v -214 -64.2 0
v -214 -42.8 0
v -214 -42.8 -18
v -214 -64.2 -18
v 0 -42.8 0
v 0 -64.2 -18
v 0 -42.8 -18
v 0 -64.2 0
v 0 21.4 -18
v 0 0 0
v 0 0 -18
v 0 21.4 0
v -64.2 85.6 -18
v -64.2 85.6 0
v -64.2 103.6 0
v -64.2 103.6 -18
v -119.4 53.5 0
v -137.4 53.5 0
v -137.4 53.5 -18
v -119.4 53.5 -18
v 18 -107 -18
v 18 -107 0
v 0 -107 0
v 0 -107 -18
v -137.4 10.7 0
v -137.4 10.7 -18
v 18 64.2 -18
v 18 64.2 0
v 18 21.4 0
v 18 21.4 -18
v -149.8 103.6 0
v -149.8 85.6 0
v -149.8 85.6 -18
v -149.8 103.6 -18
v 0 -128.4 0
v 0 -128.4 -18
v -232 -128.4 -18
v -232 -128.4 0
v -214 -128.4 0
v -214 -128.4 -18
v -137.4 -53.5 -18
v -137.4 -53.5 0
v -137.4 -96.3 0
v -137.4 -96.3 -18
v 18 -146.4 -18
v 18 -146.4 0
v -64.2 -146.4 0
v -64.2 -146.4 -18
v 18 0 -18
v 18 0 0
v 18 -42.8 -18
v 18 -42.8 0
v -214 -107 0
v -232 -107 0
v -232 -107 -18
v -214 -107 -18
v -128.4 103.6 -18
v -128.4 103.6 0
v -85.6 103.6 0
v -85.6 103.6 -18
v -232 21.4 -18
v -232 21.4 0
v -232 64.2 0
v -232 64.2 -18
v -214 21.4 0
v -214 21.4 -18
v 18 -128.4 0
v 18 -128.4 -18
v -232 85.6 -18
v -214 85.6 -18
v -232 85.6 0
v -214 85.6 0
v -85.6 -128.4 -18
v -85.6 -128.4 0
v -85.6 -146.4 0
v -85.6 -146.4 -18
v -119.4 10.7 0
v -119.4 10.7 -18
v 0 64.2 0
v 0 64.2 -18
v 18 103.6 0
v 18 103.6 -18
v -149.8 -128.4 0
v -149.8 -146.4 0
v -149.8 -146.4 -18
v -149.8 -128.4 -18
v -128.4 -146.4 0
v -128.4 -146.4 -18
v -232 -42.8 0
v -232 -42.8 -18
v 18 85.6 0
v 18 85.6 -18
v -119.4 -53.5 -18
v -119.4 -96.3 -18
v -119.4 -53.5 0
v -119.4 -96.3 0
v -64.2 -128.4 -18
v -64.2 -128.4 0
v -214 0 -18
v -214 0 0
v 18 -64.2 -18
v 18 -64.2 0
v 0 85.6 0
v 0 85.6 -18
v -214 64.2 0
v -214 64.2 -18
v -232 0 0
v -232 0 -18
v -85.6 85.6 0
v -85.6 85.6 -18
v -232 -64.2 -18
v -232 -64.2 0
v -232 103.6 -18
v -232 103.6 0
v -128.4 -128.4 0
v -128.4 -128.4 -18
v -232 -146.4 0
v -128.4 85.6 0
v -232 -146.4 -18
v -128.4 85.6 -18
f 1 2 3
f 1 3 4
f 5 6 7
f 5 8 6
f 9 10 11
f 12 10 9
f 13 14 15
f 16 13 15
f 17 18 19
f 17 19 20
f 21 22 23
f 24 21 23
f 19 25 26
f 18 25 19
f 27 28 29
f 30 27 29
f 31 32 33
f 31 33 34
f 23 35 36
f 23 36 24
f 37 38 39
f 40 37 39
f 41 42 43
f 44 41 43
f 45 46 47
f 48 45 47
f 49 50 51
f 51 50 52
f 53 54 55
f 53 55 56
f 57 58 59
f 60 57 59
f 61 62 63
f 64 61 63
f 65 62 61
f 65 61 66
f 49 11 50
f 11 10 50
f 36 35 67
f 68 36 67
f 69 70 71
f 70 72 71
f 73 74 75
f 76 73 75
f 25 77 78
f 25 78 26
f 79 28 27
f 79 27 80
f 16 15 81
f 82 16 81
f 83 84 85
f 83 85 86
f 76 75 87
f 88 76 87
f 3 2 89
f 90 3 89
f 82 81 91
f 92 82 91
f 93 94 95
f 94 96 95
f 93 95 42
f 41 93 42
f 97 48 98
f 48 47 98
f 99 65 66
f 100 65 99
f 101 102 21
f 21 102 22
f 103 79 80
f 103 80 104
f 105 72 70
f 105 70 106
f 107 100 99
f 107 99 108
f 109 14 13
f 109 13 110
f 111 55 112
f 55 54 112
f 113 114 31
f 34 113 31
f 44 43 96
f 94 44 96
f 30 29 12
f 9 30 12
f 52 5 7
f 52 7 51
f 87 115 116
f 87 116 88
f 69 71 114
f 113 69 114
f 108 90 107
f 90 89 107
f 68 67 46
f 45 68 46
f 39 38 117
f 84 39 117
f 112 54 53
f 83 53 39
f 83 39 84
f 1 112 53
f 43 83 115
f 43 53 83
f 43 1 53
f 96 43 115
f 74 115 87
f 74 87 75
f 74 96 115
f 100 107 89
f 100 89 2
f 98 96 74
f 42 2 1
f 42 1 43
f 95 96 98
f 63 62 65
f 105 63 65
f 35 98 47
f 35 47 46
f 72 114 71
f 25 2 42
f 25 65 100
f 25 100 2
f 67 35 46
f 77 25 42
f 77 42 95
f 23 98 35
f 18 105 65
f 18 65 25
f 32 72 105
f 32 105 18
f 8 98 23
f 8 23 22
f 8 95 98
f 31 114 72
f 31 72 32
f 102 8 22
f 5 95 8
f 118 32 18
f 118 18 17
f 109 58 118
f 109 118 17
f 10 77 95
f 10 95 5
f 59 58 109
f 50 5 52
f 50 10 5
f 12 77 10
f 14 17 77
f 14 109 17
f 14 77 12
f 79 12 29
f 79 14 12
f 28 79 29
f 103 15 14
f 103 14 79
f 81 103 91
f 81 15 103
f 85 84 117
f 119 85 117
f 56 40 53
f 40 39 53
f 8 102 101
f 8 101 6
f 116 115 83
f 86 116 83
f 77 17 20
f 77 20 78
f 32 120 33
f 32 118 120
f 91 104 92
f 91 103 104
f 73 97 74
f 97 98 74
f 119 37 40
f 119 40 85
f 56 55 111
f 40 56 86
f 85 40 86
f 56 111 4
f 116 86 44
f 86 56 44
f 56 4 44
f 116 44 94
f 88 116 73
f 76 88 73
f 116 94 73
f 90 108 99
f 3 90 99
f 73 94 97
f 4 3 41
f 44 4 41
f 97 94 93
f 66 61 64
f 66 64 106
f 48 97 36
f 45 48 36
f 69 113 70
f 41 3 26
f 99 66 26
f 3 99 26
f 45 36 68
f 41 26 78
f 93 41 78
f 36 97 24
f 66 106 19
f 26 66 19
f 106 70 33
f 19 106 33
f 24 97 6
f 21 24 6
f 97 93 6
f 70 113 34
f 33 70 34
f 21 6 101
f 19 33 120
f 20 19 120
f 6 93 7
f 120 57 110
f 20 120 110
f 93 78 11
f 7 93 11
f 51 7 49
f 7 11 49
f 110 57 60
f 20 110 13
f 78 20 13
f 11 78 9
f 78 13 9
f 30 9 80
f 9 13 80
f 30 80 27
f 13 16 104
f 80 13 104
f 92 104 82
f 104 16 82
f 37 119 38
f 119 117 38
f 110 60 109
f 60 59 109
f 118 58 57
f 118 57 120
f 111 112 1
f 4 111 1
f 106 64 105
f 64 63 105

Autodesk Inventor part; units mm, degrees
ref_plane "YZ Plane" through (0, 0, 0) normal (1, 0, 0) x (0, 1, 0)
ref_plane "XZ Plane" through (0, 0, 0) normal (0, 1, 0) x (-1, 0, 0)
ref_plane "XY Plane" through (0, 0, 0) normal (0, 0, 1) x (1, 0, 0)
sketch "Sketch1" plane through (0, 0, 0) normal (0, 0, 1) x (1, 0, 0)
  line L0 (-232, 103.6) -> (18, 103.6)
  line L1 (18, 103.6) -> (18, -146.4)
  line L2 (18, -146.4) -> (-232, -146.4)
  line L3 (-232, -146.4) -> (-232, 103.6)
  line L4 (0, -128.4) -> (0, 85.6)
  line L5 (0, -128.4) -> (-214, -128.4)
  line L6 (-214, -128.4) -> (0, -128.4)
  line L7 (18, 85.6) -> (18, 64.2)
  line L8 (18, 64.2) -> (0, 64.2)
  line L9 (0, 64.2) -> (0, 85.6)
  line L10 (18, 21.4) -> (0, 21.4)
  line L11 (0, 21.4) -> (0, 0)
  line L12 (0, 0) -> (18, 0)
  line L13 (0, -42.8) -> (18, -42.8)
  line L14 (18, -64.2) -> (0, -64.2)
  line L15 (18, -107) -> (0, -107)
  line L16 (-232, 103.6) -> (-232, 85.6)
  line L17 (0, 85.6) -> (0, 103.6)
  line L18 (-232, -107) -> (-214, -107)
  line L19 (-232, -64.2) -> (-214, -64.2)
  line L20 (-214, -42.8) -> (-232, -42.8)
  line L21 (-214, 0) -> (-232, 0)
  line L22 (-232, 21.4) -> (-214, 21.4)
  line L23 (-232, 64.2) -> (-214, 64.2)
  line L24 (-85.6, -128.4) -> (-85.6, -146.4)
  line L25 (-128.4, -128.4) -> (-128.4, -146.4)
  line L26 (-149.8, -146.4) -> (-149.8, -128.4)
  line L27 (-192.6, -146.4) -> (-192.6, -128.4)
  line L28 (-64.2, -146.4) -> (-64.2, -128.4)
  line L29 (-21.4, -146.4) -> (-21.4, -128.4)
  line L30 (-85.6, 103.6) -> (-85.6, 85.6)
  line L31 (-64.2, 85.6) -> (-64.2, 103.6)
  line L32 (-21.4, 85.6) -> (-21.4, 103.6)
  line L33 (-149.8, 85.6) -> (-149.8, 103.6)
  line L34 (-192.6, 85.6) -> (-192.6, 103.6)
  line L35 (-128.4, 103.6) -> (-128.4, 85.6)
  line L36 (0, 85.6) -> (-214, 85.6)
  line L37 (-214, 85.6) -> (-214, -128.4)
  line L38 (0, 85.6) -> (18, 85.6)
  line L39 (18, 85.6) -> (18, 103.6)
  line L40 (18, 103.6) -> (0, 103.6)
  line L41 (0, 103.6) -> (0, 85.6)
  line L42 (0, -128.4) -> (18, -128.4)
  line L43 (18, -128.4) -> (18, -146.4)
  line L44 (18, -146.4) -> (0, -146.4)
  line L45 (0, -146.4) -> (0, -128.4)
  line L46 (-214, -128.4) -> (-232, -128.4)
  line L47 (-232, -128.4) -> (-232, -146.4)
  line L48 (-232, -146.4) -> (-214, -146.4)
  line L49 (-214, -146.4) -> (-214, -128.4)
  line L50 (-214, 85.6) -> (-232, 85.6)
  line L51 (-232, 85.6) -> (-232, 103.6)
  line L52 (-232, 103.6) -> (-214, 103.6)
  line L53 (-214, 103.6) -> (-214, 85.6)
  point P0 (0, 0)
  point P1 (248.5081, 104.1116)
  point P2 (266.5081, 104.1116)
  point P3 (248.5081, 146.9116)
  point P4 (227.1081, 168.3116)
  point P5 (227.1081, 186.3116)
  point P6 (184.3081, 186.3116)
  point P7 (184.3081, 168.3116)
  point P8 (162.9081, 168.3116)
  point P9 (162.9081, 186.3116)
  point P10 (120.1081, 186.3116)
  point P11 (120.1081, 168.3116)
  point P12 (98.7081, 168.3116)
  point P13 (98.7081, 186.3116)
  point P14 (55.9081, 186.3116)
  point P15 (55.9081, 168.3116)
  point P16 (34.5081, 146.9116)
  point P17 (16.5081, 146.9116)
  point P18 (16.5081, 104.1116)
  point P19 (34.5081, 104.1116)
  point P20 (34.5081, 82.7116)
  point P21 (16.5081, 82.7116)
  point P22 (16.5081, 39.9116)
  point P23 (34.5081, 39.9116)
  point P24 (34.5081, 18.5116)
  point P25 (16.5081, 18.5116)
  point P26 (16.5081, -24.2884)
  point P27 (34.5081, -24.2884)
  point P28 (34.5081, -45.6884)
  point P29 (55.9081, -45.6884)
  point P30 (55.9081, -63.6884)
  point P31 (98.7081, -63.6884)
  point P32 (98.7081, -45.6884)
  point P33 (120.1081, -45.6884)
  point P34 (120.1081, -63.6884)
  point P35 (162.9081, -63.6884)
  point P36 (162.9081, -45.6884)
  point P37 (184.3081, -45.6884)
  point P38 (184.3081, -63.6884)
  point P39 (227.1081, -63.6884)
  point P40 (227.1081, -45.6884)
  point P41 (248.5081, -45.6884)
  point P42 (248.5081, -24.2884)
  point P43 (266.5081, -24.2884)
  point P44 (266.5081, 18.5116)
  point P45 (248.5081, 18.5116)
  point P46 (248.5081, 39.9116)
  point P47 (266.5081, 39.9116)
  point P48 (266.5081, 82.7116)
  point P49 (248.5081, 82.7116)
  dimension "d0" = 250
  dimension "d1" = 250
  dimension "d2" = 21.4
extrude "Plate1" add sketch "Sketch1" against normal blind 18 contours L0 L53 L50 L3 | L0 L34 L36 L53 | L0 L33 L36 L34 | L36 L4 L5 L37 | L23 L37 L22 L3 | L0 L30 L36 L35 | L21 L37 L20 L3 | L0 L32 L36 L31 | L19 L37 L18 L3 | L0 L17 L36 L32 | L18 L37 L46 L3 | L0 L1 L38 L17 | L46 L49 L2 L3 | L5 L27 L2 L49 | L8 L1 L10 L4 | L5 L26 L2 L27 | L12 L1 L13 L4 | L5 L24 L2 L25 | L14 L1 L15 L4 | L5 L29 L2 L28 | L5 L45 L2 L29 | L42 L1 L2 L45
sketch "Sketch2" plane through (0, 0, 0) normal (0, 0, 1) x (1, 0, 0)
  line L0 (-232, 0) -> (-232, -42.8)
  line L1 (-128.4, 85.6) -> (-149.8, 85.6)
  line L2 (-149.8, -128.4) -> (-128.4, -128.4)
  line L3 (-128.4, 85.6) -> (-128.4, -128.4)
  line L4 (-128.4, 85.6) -> (-128.4, -21.4)
  line L5 (-137.4, 53.5) -> (-119.4, 53.5)
  line L6 (-119.4, 53.5) -> (-119.4, 10.7)
  line L7 (-119.4, 10.7) -> (-137.4, 10.7)
  line L8 (-137.4, 10.7) -> (-137.4, 53.5)
  line L9 (-137.4, 53.5) -> (-119.4, 10.7) construction
  line L10 (-119.4, 53.5) -> (-137.4, 10.7) construction
  line L11 (-128.4, -128.4) -> (-128.4, -21.4)
  line L12 (-128.4, -21.4) -> (-128.4, -74.9)
  line L13 (-137.4, -96.3) -> (-119.4, -96.3)
  line L14 (-119.4, -96.3) -> (-119.4, -53.5)
  line L15 (-119.4, -53.5) -> (-137.4, -53.5)
  line L16 (-137.4, -53.5) -> (-137.4, -96.3)
  line L17 (-137.4, -96.3) -> (-119.4, -53.5) construction
  line L18 (-119.4, -96.3) -> (-137.4, -53.5) construction
  point P0 (0, 0)
  point P1 (-232, 103.6)
  point P2 (-128.4, 32.1)
  point P3 (-232, 103.6)
  dimension "d4" = 18
  dimension "d5" = 42.8
  dimension "d6" = 42.8
extrude "Cut1" cut sketch "Sketch2" against normal blind 18
sketch "Sketch3" plane through (0, 0, 0) normal (0, 0, 1) x (1, 0, 0)
  line L0 (-232, -128.4) -> (-214, -128.4) projected
  line L1 (-214, -128.4) -> (-214, -107) projected
  line L2 (-214, -128.4) -> (-214, -107) projected
  line L3 (-232, -107) -> (-214, -107) projected
  line L4 (-232, -107) -> (-232, -128.4) projected
  point P0 (0, 0)
extrude "Cut2" cut sketch "Sketch3" against normal blind 18
equation "\"d7\" = Thickness"
equation "\"d9\" = Thickness"
equation "\"d3\" = Thickness"
equation "\"BendRadius\" = Thickness"
equation "\"BendReliefWidth\" = Thickness"
equation "\"BendReliefDepth\" = 0.5 * Thickness"
equation "\"CornerReliefSize\" = 4 * Thickness"
equation "\"MinimumRemnant\" = 2 * Thickness"
equation "\"TransitionRadius\" = BendRadius"
equation "\"JacobiRadiusSize\" = BendRadius"
equation "\"GapSize\" = Thickness"
equation "\"Thickness\" = 18"
properties part number "1"
